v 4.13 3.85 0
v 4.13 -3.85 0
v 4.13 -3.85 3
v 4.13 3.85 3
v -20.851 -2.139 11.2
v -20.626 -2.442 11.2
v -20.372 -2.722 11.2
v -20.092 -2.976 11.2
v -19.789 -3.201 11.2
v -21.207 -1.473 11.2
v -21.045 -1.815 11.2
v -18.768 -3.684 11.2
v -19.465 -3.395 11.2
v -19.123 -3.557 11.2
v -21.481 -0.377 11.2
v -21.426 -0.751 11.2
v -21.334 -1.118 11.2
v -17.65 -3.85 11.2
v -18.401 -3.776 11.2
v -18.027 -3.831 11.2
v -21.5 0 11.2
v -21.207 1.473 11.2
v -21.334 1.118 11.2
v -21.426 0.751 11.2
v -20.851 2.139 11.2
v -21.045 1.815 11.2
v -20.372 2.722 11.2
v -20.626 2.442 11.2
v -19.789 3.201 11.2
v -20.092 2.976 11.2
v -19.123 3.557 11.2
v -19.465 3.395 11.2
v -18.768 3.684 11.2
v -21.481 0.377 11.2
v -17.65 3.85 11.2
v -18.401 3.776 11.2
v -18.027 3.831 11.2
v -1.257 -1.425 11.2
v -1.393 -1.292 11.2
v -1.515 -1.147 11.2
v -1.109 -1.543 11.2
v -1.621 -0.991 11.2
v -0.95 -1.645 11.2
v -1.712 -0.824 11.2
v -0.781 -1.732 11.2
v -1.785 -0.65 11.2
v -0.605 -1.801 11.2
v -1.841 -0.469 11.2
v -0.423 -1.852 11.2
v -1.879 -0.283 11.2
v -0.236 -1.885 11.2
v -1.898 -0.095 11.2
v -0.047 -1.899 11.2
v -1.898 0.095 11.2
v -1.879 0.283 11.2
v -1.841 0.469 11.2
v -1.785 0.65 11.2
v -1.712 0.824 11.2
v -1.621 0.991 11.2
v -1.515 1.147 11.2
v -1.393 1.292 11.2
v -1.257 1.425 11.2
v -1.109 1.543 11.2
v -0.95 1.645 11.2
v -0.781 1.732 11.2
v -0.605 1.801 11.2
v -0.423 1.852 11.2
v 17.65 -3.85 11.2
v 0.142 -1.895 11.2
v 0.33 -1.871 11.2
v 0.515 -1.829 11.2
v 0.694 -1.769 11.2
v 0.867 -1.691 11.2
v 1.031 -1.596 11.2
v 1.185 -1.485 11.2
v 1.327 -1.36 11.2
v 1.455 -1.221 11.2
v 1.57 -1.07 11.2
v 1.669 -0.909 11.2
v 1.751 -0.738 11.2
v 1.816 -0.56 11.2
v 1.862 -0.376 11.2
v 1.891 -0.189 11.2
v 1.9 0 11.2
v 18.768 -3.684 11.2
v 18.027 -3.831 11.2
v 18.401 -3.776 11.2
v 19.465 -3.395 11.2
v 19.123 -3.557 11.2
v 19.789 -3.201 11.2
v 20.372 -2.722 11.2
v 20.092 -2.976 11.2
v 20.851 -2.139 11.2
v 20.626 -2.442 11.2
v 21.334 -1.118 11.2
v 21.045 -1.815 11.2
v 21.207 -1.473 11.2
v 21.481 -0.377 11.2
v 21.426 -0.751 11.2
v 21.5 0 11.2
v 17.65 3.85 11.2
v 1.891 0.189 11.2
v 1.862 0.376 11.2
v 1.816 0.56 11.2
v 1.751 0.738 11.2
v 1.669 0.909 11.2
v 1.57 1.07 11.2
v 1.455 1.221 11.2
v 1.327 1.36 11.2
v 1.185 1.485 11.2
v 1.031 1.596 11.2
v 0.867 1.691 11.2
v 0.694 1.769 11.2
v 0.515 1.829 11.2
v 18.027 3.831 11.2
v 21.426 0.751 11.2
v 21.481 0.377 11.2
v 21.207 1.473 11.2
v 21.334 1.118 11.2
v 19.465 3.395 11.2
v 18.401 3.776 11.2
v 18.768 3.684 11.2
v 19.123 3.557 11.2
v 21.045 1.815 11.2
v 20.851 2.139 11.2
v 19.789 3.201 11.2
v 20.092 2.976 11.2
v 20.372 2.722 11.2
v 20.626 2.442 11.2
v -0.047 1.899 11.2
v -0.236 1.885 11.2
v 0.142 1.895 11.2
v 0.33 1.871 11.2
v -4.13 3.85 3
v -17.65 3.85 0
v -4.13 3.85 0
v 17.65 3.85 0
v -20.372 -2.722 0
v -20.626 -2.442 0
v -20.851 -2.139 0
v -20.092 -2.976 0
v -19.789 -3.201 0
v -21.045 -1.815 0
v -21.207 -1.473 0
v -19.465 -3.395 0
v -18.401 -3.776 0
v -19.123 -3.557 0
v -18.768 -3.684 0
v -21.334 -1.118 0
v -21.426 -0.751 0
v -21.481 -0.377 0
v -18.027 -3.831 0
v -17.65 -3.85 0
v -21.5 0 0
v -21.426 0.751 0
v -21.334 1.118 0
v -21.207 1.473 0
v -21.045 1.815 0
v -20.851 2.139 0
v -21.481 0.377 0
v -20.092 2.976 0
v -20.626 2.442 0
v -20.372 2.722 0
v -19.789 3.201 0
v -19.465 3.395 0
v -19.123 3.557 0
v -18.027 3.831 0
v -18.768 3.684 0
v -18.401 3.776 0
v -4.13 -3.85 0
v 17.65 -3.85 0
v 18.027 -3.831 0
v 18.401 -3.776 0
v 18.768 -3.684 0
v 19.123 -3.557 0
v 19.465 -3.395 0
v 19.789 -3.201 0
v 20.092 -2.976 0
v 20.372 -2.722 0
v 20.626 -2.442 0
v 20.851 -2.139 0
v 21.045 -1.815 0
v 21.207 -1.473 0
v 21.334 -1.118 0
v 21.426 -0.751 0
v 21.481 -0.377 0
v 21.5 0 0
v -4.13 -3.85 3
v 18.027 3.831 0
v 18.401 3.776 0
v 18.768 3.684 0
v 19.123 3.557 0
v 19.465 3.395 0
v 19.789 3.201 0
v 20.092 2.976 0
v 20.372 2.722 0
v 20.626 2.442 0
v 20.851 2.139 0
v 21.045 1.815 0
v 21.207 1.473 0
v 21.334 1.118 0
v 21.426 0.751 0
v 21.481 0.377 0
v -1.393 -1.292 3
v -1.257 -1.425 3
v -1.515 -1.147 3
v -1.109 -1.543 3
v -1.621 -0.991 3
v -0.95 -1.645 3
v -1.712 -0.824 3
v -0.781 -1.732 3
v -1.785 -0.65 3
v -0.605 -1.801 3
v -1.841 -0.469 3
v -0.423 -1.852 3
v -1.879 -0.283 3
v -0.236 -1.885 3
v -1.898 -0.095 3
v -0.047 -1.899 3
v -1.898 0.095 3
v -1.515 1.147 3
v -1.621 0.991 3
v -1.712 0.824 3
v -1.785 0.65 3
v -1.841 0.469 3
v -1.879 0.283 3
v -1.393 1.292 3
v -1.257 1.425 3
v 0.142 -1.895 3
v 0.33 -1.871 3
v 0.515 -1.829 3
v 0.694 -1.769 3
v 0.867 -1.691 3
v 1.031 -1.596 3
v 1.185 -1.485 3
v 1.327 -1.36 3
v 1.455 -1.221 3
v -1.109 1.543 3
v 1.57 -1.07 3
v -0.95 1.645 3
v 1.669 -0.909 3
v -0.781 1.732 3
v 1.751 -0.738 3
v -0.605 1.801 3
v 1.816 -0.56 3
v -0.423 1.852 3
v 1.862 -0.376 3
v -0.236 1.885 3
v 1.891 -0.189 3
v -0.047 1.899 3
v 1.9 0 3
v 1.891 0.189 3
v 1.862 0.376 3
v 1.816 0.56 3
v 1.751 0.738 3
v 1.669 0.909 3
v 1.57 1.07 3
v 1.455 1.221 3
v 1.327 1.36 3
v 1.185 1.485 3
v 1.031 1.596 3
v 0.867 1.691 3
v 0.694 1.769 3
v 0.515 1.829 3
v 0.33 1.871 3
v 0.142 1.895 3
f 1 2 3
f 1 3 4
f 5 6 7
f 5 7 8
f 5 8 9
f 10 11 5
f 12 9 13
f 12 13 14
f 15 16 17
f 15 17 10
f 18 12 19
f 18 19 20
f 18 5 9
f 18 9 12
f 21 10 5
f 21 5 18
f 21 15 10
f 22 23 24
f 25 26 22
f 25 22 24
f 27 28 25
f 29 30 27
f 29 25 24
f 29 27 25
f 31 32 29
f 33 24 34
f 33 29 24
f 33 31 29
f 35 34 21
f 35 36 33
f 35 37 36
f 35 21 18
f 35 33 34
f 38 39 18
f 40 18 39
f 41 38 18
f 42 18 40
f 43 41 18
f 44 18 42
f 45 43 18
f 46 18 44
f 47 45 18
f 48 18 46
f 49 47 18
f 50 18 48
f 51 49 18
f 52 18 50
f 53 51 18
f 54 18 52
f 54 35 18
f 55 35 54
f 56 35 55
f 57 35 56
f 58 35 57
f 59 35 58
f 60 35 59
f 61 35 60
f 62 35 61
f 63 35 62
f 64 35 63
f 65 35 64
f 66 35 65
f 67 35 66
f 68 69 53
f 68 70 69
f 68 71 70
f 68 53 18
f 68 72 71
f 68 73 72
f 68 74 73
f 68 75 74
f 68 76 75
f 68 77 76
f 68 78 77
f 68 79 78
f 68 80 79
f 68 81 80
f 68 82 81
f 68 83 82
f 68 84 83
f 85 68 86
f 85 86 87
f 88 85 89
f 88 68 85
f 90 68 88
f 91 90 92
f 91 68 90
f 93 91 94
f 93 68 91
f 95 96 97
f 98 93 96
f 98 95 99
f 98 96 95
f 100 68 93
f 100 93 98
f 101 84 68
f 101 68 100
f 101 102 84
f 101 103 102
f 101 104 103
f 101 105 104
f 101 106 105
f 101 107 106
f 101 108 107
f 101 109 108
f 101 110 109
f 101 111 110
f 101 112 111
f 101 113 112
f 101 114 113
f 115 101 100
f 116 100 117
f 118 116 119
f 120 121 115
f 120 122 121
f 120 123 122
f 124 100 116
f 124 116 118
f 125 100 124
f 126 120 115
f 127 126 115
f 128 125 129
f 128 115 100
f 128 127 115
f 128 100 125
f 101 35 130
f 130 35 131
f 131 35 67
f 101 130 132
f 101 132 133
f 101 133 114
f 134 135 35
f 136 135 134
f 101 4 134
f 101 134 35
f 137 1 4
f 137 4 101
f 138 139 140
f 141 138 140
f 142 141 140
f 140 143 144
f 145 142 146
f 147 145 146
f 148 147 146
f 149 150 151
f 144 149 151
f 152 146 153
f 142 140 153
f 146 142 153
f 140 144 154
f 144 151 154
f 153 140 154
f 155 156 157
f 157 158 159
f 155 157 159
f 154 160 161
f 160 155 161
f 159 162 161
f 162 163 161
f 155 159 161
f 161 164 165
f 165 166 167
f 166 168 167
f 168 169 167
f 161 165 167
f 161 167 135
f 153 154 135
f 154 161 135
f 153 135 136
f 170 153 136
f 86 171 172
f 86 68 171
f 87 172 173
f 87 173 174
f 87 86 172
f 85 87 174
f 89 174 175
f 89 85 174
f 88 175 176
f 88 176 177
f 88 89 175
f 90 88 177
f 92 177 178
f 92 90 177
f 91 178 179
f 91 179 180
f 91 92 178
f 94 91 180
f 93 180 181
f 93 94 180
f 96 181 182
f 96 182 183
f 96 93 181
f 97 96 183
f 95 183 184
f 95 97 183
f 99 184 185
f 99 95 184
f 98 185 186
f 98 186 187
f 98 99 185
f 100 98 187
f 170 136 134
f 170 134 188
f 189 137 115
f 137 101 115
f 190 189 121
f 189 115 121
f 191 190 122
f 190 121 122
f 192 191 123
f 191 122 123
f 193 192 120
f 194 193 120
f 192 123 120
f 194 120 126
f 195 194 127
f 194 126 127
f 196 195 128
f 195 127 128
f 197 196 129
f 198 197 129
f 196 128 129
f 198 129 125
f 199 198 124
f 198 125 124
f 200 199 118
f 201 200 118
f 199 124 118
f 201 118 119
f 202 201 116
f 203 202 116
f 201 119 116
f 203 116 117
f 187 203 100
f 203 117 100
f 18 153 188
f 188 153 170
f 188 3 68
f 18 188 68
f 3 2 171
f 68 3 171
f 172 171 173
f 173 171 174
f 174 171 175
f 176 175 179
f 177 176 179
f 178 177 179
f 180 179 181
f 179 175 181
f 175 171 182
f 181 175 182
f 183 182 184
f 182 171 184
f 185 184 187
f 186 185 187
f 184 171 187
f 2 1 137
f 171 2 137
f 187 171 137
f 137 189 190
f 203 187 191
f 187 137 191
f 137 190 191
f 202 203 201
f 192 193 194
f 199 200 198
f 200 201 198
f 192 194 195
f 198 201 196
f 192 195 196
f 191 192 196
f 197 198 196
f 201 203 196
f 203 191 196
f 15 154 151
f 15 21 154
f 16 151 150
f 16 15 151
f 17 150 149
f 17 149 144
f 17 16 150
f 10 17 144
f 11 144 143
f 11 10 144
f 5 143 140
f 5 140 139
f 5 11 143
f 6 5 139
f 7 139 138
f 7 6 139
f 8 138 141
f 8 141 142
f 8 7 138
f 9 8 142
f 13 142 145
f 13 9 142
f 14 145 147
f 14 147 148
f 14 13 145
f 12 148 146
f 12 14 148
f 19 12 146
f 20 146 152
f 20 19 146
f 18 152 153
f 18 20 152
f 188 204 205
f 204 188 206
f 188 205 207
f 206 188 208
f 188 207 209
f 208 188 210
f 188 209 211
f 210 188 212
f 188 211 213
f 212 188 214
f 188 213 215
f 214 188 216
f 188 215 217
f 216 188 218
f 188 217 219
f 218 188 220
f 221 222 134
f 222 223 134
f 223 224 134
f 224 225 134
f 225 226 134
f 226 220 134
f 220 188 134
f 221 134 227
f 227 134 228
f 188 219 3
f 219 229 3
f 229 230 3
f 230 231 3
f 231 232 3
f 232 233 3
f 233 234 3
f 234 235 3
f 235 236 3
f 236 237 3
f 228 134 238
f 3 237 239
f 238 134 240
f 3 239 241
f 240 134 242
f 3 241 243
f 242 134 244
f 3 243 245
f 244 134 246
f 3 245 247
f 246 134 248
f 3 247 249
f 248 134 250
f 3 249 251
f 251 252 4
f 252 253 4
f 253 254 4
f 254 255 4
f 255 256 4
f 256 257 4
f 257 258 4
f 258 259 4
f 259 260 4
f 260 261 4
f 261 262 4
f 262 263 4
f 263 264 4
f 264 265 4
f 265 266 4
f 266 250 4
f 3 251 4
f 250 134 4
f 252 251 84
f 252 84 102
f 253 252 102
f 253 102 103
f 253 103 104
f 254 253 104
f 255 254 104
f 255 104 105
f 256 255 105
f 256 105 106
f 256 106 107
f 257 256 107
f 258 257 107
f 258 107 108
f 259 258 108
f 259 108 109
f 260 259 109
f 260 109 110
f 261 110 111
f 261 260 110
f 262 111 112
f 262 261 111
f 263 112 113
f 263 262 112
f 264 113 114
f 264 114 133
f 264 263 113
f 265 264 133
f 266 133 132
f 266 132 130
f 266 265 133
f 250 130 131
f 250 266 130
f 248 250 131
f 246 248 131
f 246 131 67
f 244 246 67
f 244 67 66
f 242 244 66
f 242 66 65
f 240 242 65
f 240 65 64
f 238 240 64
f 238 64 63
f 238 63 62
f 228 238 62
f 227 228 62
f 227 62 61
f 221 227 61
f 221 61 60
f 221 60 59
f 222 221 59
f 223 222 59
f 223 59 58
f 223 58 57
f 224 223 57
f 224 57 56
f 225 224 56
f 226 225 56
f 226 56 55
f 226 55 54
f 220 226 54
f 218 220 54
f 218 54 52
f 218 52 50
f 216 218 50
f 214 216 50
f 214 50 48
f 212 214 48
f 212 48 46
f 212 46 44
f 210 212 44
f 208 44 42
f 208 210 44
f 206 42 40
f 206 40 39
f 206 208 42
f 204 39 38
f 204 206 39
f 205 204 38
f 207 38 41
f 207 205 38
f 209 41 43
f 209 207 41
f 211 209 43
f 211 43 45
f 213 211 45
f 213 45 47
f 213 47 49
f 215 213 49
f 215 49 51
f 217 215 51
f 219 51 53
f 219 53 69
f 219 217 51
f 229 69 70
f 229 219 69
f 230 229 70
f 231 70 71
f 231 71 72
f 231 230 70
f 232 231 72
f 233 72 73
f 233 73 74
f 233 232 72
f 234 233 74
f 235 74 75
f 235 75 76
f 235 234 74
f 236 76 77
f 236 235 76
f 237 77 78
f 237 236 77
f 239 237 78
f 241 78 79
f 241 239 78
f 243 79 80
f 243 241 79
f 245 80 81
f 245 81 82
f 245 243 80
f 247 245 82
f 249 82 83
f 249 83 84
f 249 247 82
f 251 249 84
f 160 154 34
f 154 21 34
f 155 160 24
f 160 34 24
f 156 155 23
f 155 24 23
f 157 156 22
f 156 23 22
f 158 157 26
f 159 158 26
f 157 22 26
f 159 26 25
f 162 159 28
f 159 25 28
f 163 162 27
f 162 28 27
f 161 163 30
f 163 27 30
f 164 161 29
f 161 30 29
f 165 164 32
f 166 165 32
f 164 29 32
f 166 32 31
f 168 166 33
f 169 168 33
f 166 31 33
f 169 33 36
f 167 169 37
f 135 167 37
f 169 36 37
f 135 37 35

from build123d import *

# Parameters (mm, degrees)
F1_W     = 43
F1_H     = 7.7
F1_R     = 1.9
F3_DEPTH = 11.2
F2_R     = 3.4
F2_R_2   = 1.9
F4_DEPTH = 3
F5_R     = 3.84999
F6_W     = 8.2597071305
F6_H     = 7.7
F6_H_2   = 7.1181999311
F7_DEPTH = 3


# Not quite as in the source:
# - a fillet or chamfer is up to 0.001 mm smaller than in the source, because OpenCascade refuses the exact size


with BuildPart() as f3:
    # F1 (on face) → F3 (new body)
    with BuildSketch(Plane.XY):
        Rectangle(F1_W, F1_H)
        Circle(F1_R, mode=Mode.SUBTRACT)
    extrude(amount=F3_DEPTH)

    # F2 (on face) → F4 (cut)
    with BuildSketch(Plane.XY):
        Circle(F2_R)
        Circle(F2_R_2, mode=Mode.SUBTRACT)
    extrude(amount=F4_DEPTH, mode=Mode.SUBTRACT)

    # F5 (radius 3.85 in the source; OpenCascade refuses exactly that, so slightly less here)
    f5_edges = [f3.edges().sort_by_distance(p)[0] for p in [
        (-21.5, -3.85, 5.6),
        (-21.5, 3.85, 5.6),
        (21.5, -3.85, 5.6),
        (21.5, 3.85, 5.6),
    ]]
    fillet(f5_edges, radius=F5_R)

    # F6 (on face) → F7 (cut)
    with BuildSketch(Plane.XY):
        Rectangle(F6_W, F6_H)
        with Locations((0, -7.4090999655)):
            Rectangle(F6_W, F6_H_2)
        with Locations((0, 7.4090999655)):
            Rectangle(F6_W, F6_H_2)
    extrude(amount=F7_DEPTH, mode=Mode.SUBTRACT)


solid = f3.part
